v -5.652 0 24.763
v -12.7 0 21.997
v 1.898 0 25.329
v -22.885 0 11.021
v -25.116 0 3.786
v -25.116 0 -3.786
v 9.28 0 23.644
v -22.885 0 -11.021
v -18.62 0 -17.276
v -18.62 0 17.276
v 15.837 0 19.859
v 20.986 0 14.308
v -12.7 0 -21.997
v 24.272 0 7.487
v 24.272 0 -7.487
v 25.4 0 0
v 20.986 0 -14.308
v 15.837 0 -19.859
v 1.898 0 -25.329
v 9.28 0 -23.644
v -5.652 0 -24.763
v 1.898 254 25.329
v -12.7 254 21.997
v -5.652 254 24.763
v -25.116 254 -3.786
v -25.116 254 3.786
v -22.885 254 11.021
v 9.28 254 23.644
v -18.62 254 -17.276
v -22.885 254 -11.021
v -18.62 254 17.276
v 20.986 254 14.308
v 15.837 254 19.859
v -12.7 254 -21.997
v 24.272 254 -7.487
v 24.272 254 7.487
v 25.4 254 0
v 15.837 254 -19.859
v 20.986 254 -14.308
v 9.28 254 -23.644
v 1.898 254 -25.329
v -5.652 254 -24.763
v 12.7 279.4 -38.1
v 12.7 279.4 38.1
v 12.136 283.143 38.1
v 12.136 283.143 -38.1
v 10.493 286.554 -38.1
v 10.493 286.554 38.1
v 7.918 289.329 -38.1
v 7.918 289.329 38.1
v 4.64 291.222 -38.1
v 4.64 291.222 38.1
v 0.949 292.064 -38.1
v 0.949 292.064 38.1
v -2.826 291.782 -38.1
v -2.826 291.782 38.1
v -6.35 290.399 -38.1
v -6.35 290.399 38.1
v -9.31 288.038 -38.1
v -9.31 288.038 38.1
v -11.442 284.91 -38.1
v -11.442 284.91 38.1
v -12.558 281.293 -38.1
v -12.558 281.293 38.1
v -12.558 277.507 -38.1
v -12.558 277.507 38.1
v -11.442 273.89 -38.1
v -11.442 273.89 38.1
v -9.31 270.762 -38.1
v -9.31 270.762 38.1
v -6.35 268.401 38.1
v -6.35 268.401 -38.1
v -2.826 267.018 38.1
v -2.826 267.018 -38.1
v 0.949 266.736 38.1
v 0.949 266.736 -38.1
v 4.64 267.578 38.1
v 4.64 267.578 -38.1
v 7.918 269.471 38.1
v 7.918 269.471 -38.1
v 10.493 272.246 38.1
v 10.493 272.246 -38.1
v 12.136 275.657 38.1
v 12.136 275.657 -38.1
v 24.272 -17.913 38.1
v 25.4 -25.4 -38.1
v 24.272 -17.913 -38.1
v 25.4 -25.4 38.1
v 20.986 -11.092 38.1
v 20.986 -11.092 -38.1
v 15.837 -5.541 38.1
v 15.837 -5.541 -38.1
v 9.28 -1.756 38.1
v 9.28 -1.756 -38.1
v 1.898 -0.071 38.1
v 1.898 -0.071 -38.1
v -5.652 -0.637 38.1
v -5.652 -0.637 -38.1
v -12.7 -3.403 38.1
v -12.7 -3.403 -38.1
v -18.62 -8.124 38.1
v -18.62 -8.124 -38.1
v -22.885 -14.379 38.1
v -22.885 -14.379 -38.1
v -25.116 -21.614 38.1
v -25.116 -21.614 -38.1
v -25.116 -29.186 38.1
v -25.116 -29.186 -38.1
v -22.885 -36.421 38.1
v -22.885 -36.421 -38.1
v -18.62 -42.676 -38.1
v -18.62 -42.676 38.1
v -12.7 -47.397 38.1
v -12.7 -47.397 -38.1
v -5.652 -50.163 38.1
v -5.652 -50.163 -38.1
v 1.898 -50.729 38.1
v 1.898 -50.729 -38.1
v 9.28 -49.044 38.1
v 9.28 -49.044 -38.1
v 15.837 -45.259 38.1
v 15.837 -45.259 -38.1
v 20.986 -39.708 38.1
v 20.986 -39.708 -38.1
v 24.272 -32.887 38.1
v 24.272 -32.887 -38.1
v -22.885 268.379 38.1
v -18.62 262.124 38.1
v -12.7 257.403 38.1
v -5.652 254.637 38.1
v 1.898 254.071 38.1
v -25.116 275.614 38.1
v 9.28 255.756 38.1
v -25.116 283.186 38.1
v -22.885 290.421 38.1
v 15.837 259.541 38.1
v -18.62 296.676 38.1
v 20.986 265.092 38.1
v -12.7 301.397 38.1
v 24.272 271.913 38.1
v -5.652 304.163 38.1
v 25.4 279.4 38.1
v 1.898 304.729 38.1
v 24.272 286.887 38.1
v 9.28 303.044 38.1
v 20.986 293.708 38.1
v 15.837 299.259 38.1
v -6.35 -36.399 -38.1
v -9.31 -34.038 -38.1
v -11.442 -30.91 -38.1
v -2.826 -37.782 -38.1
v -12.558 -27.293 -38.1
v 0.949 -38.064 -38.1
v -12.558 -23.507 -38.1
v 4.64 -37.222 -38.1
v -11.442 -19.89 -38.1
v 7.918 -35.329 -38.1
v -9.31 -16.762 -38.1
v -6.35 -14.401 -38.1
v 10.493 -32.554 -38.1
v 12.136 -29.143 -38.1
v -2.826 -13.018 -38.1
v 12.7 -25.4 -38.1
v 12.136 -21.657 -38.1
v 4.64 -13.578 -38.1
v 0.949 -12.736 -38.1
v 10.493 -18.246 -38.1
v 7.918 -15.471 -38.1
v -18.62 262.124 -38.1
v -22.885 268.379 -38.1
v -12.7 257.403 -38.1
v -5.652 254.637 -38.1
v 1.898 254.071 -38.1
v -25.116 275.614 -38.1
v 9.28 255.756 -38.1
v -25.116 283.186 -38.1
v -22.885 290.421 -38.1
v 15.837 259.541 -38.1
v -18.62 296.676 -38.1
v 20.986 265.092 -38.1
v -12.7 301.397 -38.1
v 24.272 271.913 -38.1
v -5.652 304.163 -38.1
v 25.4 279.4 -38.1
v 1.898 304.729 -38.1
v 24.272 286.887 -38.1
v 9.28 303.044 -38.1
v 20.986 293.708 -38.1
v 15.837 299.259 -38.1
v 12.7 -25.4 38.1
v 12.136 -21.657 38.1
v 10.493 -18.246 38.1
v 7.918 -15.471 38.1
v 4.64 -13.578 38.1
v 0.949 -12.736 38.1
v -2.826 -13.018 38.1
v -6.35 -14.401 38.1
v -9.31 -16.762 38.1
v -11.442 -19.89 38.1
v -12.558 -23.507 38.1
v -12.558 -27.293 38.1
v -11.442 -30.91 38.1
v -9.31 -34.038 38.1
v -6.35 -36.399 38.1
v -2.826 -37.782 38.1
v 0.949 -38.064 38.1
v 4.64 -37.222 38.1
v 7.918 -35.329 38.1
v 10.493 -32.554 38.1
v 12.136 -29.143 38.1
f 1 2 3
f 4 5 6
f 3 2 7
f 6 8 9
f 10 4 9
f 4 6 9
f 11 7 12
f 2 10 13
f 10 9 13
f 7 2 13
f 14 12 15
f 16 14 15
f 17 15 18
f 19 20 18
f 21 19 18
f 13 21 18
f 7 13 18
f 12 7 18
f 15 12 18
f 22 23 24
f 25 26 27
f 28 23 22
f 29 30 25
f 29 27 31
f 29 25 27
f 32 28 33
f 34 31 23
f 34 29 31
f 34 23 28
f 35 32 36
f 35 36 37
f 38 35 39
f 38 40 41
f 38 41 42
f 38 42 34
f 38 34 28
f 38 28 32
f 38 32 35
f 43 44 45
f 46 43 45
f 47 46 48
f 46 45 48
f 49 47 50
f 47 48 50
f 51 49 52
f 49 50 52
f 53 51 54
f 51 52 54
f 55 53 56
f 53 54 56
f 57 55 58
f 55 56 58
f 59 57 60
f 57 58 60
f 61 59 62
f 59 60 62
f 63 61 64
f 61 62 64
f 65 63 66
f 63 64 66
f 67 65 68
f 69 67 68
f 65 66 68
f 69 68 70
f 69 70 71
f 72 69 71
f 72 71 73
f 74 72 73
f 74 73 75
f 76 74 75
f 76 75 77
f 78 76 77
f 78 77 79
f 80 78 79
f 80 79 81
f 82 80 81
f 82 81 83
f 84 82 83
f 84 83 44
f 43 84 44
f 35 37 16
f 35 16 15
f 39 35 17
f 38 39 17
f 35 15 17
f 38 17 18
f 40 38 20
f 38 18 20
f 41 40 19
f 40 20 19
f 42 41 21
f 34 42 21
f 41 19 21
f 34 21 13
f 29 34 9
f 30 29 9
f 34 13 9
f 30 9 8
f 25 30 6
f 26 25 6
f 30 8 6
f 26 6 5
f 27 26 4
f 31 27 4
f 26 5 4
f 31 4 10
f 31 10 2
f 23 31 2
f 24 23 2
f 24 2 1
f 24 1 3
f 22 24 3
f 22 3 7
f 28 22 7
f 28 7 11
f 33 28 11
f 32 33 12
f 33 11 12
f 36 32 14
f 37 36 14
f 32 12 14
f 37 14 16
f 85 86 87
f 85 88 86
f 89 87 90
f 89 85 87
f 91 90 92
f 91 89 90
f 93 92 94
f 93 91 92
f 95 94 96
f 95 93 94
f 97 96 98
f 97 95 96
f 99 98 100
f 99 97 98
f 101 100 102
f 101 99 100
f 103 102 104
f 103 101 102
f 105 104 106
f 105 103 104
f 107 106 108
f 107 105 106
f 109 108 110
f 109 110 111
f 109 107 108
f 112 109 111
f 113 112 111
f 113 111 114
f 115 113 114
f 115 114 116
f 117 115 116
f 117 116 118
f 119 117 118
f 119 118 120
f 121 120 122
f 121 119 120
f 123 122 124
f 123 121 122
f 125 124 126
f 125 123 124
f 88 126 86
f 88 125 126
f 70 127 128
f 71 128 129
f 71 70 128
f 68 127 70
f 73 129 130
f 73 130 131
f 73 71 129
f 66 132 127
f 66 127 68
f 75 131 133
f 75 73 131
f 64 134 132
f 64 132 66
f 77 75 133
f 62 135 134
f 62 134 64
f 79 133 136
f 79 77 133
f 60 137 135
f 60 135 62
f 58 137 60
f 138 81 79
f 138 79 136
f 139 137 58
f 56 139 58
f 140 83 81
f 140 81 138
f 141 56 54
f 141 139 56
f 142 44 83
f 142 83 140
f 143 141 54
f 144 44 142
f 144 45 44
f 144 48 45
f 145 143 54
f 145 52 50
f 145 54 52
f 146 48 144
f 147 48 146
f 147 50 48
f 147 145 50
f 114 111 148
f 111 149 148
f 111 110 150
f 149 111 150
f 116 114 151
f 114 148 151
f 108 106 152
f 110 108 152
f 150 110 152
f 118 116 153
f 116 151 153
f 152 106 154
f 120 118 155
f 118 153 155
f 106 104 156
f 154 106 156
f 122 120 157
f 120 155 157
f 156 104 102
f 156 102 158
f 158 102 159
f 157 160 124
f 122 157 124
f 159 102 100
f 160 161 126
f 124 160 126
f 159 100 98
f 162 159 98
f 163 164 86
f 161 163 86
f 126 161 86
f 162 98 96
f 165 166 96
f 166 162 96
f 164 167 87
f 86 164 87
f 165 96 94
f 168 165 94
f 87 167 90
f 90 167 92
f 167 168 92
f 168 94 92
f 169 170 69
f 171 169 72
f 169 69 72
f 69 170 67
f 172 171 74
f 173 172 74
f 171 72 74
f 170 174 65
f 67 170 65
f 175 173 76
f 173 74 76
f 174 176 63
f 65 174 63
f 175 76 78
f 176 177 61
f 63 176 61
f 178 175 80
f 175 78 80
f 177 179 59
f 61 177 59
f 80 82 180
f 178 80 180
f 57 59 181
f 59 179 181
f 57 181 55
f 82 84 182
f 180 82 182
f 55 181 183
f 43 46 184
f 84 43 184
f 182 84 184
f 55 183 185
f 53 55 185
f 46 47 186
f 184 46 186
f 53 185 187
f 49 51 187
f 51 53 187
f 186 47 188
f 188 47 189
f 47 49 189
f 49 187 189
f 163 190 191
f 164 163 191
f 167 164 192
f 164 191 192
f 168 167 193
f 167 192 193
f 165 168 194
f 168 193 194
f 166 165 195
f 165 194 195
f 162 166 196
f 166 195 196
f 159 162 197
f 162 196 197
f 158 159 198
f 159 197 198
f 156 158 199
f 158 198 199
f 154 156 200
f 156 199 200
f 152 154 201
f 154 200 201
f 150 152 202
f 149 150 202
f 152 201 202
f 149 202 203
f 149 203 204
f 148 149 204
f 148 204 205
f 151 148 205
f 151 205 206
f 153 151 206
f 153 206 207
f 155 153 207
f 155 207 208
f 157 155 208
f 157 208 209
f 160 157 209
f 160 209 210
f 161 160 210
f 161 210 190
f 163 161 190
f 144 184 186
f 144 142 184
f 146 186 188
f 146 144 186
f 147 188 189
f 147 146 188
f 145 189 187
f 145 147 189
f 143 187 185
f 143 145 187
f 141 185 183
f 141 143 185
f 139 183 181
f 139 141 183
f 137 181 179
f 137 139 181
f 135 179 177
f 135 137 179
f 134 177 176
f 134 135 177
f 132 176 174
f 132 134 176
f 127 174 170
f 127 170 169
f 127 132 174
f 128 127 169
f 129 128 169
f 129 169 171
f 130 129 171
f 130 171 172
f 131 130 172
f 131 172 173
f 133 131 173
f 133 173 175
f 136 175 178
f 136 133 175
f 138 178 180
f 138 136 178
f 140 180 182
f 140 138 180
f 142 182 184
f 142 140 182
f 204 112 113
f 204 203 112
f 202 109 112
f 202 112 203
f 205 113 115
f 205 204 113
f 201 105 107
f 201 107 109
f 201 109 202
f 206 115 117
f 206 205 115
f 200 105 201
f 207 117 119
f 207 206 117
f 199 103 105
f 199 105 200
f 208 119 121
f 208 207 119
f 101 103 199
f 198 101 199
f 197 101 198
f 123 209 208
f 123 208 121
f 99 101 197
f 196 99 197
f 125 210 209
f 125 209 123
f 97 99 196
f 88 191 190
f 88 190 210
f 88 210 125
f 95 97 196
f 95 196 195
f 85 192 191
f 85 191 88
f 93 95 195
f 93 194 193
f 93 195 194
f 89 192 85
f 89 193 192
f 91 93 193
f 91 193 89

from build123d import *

# Parameters (mm, degrees)
SKETCH2_R           = 25.4
BOSS_EXTRUDE1_DEPTH = 254
SKETCH3_R           = 25.4
BOSS_EXTRUDE2_DEPTH = 38.1
SKETCH4_R           = 25.4
BOSS_EXTRUDE3_DEPTH = 38.1
SKETCH5_R           = 12.7
CUT_EXTRUDE1_DEPTH  = 77.2
SKETCH6_R           = 12.7
CUT_EXTRUDE2_DEPTH  = 77.2


with BuildPart() as part:
    # Sketch2 → Boss-Extrude1 (new body)
    with BuildSketch(Plane(origin=(0, 0, 0), x_dir=(1, 0, 0), z_dir=(0, 1, 0))):
        Circle(SKETCH2_R)
    extrude(amount=BOSS_EXTRUDE1_DEPTH)


with BuildPart() as body_2:
    # Sketch3 → Boss-Extrude2 (new body, symmetric)
    with BuildSketch(Plane.XY):
        with Locations((0, 279.4)):
            Circle(SKETCH3_R)
    extrude(amount=BOSS_EXTRUDE2_DEPTH, both=True)

    # Sketch5 → Cut-Extrude1 (cut, through all)
    with BuildSketch(Plane.XY.offset(38.1)):
        with Locations((0, 279.4)):
            Circle(SKETCH5_R)
    extrude(amount=-CUT_EXTRUDE1_DEPTH, mode=Mode.SUBTRACT)


with BuildPart() as body_3:
    # Sketch4 → Boss-Extrude3 (new body, symmetric)
    with BuildSketch(Plane.XY):
        with Locations((0, -25.4)):
            Circle(SKETCH4_R)
    extrude(amount=BOSS_EXTRUDE3_DEPTH, both=True)

    # Sketch6 → Cut-Extrude2 (cut, through all)
    with BuildSketch(Plane.XY.offset(38.1)):
        with Locations((0, -25.4)):
            Circle(SKETCH6_R)
    extrude(amount=-CUT_EXTRUDE2_DEPTH, mode=Mode.SUBTRACT)


solid = Compound([part.part, body_2.part, body_3.part])
